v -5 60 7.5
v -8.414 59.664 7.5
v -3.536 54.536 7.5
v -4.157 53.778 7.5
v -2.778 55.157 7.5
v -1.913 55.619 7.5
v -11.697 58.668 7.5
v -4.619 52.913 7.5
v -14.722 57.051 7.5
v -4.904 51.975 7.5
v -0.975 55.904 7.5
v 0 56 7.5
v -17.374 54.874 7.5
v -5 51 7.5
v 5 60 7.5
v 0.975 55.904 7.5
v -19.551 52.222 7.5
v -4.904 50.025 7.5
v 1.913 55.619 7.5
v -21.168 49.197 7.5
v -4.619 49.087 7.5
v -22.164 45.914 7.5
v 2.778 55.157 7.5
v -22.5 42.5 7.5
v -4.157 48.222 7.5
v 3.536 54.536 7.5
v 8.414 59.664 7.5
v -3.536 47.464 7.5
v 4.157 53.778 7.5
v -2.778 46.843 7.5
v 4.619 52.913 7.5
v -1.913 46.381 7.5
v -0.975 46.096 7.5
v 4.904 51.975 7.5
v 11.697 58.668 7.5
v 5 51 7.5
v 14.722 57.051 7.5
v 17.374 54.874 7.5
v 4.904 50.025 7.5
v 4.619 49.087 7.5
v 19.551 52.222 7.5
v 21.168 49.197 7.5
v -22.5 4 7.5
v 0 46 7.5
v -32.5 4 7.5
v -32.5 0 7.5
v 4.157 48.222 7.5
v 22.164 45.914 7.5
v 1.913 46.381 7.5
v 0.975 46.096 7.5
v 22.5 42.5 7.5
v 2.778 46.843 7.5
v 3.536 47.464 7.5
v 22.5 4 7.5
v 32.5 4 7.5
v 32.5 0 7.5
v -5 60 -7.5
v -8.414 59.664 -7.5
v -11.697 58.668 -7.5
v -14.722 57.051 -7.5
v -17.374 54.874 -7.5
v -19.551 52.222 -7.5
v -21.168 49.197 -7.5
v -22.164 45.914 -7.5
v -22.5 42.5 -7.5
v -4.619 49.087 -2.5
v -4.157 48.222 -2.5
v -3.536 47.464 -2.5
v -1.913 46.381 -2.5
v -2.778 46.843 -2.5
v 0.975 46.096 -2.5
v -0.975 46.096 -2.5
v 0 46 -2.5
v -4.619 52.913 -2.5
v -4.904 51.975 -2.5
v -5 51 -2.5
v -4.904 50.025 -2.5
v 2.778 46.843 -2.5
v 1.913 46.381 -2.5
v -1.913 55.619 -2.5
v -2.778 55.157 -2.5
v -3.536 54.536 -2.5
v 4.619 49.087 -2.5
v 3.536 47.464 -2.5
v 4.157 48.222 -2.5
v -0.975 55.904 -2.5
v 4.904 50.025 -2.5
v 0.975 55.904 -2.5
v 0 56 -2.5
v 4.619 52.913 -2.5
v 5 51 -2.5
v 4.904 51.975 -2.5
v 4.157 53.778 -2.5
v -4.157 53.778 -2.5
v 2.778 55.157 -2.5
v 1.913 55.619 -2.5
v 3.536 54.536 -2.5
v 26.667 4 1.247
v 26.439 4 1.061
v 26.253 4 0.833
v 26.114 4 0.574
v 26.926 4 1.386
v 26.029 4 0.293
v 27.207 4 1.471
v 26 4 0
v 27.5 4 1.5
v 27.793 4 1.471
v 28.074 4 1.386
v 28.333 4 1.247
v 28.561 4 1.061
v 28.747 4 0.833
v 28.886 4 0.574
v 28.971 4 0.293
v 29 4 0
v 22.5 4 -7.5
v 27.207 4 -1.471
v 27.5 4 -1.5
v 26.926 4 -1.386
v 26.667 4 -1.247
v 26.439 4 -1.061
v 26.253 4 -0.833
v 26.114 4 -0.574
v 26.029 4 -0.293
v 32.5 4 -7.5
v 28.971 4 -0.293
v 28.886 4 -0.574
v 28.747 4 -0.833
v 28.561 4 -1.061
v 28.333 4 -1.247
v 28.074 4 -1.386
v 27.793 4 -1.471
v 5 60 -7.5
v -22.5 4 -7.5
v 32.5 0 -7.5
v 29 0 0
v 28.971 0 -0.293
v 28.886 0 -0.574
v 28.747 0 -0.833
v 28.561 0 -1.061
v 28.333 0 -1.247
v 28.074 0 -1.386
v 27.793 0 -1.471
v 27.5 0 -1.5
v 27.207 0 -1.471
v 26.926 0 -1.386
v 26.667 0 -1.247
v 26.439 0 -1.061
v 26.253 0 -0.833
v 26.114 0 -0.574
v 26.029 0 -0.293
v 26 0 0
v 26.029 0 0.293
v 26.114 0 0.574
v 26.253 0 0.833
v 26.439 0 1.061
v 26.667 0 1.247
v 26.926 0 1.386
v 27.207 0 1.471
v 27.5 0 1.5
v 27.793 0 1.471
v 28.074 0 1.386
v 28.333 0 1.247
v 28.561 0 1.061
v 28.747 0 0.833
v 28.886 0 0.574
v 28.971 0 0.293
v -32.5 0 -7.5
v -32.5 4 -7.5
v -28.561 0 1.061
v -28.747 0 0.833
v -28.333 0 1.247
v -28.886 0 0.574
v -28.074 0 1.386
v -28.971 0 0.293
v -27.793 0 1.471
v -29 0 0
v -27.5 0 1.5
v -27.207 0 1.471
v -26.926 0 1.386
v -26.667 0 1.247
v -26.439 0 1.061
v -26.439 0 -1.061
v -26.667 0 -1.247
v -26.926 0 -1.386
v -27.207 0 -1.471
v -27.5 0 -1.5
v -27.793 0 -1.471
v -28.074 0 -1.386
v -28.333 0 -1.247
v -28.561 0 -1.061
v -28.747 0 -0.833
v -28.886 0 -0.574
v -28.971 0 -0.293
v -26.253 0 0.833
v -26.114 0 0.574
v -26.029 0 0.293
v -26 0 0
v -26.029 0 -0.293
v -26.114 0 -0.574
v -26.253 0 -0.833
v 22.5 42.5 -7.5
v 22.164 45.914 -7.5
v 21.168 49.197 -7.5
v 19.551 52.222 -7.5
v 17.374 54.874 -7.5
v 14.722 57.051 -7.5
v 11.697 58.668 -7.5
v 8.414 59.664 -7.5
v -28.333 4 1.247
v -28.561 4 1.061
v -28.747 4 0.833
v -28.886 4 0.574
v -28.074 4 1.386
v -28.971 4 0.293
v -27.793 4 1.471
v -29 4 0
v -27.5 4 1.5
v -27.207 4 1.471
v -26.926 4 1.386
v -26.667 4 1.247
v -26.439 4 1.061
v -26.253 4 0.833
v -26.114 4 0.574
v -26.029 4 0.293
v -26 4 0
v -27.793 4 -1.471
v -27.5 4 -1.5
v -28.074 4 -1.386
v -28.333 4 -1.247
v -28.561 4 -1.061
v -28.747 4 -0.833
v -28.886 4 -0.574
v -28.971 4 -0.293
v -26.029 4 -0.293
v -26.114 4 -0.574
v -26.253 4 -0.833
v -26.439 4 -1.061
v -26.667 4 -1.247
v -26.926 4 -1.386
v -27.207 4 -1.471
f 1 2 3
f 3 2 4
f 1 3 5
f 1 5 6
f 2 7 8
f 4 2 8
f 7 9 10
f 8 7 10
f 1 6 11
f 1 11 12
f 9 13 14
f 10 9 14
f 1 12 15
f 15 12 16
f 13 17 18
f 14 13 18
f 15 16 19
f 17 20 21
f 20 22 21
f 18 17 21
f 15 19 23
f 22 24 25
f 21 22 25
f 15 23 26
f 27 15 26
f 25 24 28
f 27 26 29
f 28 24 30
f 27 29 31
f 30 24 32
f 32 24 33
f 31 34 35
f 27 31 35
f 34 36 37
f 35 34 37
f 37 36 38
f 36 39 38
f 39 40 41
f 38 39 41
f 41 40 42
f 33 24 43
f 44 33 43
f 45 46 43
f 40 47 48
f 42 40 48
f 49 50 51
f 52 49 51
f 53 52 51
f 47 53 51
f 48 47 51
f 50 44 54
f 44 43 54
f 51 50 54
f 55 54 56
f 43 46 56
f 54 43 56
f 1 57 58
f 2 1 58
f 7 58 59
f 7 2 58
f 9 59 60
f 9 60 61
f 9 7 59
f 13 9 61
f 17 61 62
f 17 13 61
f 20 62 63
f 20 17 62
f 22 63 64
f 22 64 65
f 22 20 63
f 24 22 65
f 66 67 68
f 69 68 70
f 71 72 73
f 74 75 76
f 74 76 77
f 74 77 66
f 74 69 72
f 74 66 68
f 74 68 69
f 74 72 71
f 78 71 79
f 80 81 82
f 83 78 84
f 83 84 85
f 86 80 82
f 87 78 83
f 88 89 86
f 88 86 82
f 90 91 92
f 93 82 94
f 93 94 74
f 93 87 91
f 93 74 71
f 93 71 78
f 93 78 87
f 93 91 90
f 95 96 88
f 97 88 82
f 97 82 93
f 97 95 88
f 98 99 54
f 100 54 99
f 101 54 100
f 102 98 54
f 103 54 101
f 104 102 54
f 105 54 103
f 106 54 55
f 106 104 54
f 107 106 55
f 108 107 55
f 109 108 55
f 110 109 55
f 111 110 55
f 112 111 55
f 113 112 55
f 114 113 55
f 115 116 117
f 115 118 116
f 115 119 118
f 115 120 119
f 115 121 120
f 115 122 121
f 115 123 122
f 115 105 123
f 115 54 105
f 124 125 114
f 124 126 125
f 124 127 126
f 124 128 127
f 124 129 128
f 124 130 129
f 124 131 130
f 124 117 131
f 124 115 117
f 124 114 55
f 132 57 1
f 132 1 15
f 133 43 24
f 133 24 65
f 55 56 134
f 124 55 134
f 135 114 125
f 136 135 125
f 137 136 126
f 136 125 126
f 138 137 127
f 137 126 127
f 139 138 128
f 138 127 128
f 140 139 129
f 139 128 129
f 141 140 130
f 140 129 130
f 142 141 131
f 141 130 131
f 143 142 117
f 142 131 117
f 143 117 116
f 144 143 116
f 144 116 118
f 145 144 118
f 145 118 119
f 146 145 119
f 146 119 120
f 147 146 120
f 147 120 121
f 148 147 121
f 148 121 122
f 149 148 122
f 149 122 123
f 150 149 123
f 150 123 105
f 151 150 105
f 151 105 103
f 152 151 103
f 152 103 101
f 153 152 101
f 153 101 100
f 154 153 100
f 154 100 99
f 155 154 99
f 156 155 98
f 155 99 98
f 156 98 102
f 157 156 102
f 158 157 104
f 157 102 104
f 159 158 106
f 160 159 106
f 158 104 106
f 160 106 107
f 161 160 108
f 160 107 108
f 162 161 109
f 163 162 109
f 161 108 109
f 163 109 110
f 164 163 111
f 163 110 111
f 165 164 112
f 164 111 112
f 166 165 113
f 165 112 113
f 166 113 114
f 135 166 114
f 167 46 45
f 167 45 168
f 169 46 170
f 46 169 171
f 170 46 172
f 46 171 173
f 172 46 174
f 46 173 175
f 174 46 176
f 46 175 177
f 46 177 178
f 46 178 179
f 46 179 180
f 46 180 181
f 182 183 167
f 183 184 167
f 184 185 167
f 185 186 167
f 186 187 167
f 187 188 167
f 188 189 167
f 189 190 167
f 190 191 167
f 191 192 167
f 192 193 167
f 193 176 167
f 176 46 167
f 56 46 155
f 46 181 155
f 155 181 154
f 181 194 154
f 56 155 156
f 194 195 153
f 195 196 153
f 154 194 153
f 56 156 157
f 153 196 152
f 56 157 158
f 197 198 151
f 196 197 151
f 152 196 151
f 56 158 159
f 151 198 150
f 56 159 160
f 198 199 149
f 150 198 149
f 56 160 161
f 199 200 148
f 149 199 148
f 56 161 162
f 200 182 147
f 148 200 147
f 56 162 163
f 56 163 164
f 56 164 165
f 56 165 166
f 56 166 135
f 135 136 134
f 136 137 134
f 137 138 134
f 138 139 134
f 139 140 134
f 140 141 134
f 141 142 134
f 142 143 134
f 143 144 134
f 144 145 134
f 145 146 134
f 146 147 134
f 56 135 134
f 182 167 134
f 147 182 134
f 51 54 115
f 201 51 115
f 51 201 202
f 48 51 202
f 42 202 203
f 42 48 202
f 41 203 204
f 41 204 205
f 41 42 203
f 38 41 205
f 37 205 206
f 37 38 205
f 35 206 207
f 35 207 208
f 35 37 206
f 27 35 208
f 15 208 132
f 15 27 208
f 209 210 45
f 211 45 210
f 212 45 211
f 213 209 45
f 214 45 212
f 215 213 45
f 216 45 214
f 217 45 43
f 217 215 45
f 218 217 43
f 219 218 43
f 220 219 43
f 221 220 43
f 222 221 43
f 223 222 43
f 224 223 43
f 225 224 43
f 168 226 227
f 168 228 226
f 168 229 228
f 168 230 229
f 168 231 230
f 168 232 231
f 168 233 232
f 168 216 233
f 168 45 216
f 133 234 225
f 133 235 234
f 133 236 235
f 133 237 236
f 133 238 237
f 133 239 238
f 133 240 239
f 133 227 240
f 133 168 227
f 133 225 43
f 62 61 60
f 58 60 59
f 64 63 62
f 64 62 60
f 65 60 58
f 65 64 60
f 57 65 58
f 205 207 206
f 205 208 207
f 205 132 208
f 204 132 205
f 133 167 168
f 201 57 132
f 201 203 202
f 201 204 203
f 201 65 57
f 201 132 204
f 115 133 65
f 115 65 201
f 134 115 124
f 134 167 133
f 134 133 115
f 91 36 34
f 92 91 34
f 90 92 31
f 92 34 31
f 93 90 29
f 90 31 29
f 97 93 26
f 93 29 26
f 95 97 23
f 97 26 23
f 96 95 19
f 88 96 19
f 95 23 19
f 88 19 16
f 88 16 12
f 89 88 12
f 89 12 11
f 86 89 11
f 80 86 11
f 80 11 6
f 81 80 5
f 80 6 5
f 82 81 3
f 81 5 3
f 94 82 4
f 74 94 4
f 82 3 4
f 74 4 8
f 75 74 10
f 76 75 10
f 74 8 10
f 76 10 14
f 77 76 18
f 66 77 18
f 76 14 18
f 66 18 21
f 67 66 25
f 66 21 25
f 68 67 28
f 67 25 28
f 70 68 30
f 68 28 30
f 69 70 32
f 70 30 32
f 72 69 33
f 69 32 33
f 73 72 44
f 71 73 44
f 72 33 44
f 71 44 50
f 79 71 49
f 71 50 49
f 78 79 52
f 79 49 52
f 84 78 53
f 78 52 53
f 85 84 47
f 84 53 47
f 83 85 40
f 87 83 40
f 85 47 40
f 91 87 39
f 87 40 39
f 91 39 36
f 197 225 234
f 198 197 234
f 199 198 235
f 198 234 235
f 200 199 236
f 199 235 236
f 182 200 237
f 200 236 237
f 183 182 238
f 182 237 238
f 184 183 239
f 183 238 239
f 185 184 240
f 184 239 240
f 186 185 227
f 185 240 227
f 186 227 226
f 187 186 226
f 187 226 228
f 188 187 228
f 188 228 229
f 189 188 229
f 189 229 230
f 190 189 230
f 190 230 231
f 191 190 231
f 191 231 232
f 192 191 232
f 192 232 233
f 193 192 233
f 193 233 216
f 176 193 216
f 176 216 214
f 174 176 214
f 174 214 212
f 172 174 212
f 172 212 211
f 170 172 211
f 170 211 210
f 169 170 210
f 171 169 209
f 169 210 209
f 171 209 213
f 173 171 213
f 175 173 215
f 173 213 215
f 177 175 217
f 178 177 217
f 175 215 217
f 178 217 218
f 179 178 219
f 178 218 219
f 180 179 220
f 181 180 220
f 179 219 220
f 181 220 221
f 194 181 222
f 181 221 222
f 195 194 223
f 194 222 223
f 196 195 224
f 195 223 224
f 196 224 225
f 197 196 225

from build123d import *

# Parameters (mm, degrees)
SKETCH1_W           = 65
SKETCH1_H           = 15
BOSS_EXTRUDE1_DEPTH = 4
SKETCH2_W           = 45
SKETCH2_H           = 15
BOSS_EXTRUDE2_DEPTH = 56
SKETCH3_R           = 5
CUT_EXTRUDE1_DEPTH  = 10
CUT_EXTRUDE4_REACH  = 6
SKETCH5_R           = 1.5
CUT_EXTRUDE5_REACH  = 17


with BuildPart() as part:
    # Sketch1 → Boss-Extrude1 (new body)
    with BuildSketch(Plane(origin=(0, 0, 0), x_dir=(1, 0, 0), z_dir=(0, 1, 0))):
        Rectangle(SKETCH1_W, SKETCH1_H)
    extrude(amount=BOSS_EXTRUDE1_DEPTH)

    # Sketch2 → Boss-Extrude2 (add)
    with BuildSketch(Plane(origin=(0, 4, 0), x_dir=(1, 0, 0), z_dir=(0, 1, 0))):
        Rectangle(SKETCH2_W, SKETCH2_H)
    extrude(amount=BOSS_EXTRUDE2_DEPTH)

    # Sketch3 → Cut-Extrude1 (cut)
    with BuildSketch(Plane.XY.offset(7.5)):
        with Locations((0, 51)):
            Circle(SKETCH3_R)
    extrude(amount=-CUT_EXTRUDE1_DEPTH, mode=Mode.SUBTRACT)

    # Sketch5 → Cut-Extrude4 (cut, up to next)
    with BuildSketch(Plane(origin=(0, 4, 0), x_dir=(1, 0, 0), z_dir=(0, 1, 0)), mode=Mode.PRIVATE) as cut_extrude4_sk1:
        with Locations((-27.5, 0)):
            Circle(SKETCH5_R)
    cut_extrude4_tool1 = extrude(cut_extrude4_sk1.sketch, amount=-CUT_EXTRUDE4_REACH, mode=Mode.PRIVATE) & part.part
    add(cut_extrude4_tool1.solids().sort_by_distance((-27.5, 4, 0))[0], mode=Mode.SUBTRACT)
    # Sketch5 → Cut-Extrude4 (cut, up to next)
    with BuildSketch(Plane(origin=(0, 4, 0), x_dir=(1, 0, 0), z_dir=(0, 1, 0)), mode=Mode.PRIVATE) as cut_extrude4_sk2:
        with Locations((27.5, 0)):
            Circle(SKETCH5_R)
    cut_extrude4_tool2 = extrude(cut_extrude4_sk2.sketch, amount=-CUT_EXTRUDE4_REACH, mode=Mode.PRIVATE) & part.part
    add(cut_extrude4_tool2.solids().sort_by_distance((27.5, 4, 0))[0], mode=Mode.SUBTRACT)

    # Sketch6 → Cut-Extrude5 (cut, up to next)
    with BuildSketch(Plane.XY.offset(7.5), mode=Mode.PRIVATE) as cut_extrude5_sk1:
        with BuildLine():
            Line((5, 60), (22.5, 60))
            Line((22.5, 60), (22.5, 42.5))
            ThreePointArc((22.5, 42.5), (17.374368671, 54.874368671), (5, 60))
        make_face()
    cut_extrude5_tool1 = extrude(cut_extrude5_sk1.sketch, amount=-CUT_EXTRUDE5_REACH, mode=Mode.PRIVATE) & part.part
    add(cut_extrude5_tool1.solids().sort_by_distance((18.591061, 56.091061, 7.5))[0], mode=Mode.SUBTRACT)
    # Sketch6 → Cut-Extrude5 (cut, up to next)
    with BuildSketch(Plane.XY.offset(7.5), mode=Mode.PRIVATE) as cut_extrude5_sk2:
        with BuildLine():
            Line((-22.5, 42.5), (-22.5, 60))
            Line((-22.5, 60), (-5, 60))
            ThreePointArc((-5, 60), (-17.374368671, 54.874368671), (-22.5, 42.5))
        make_face()
    cut_extrude5_tool2 = extrude(cut_extrude5_sk2.sketch, amount=-CUT_EXTRUDE5_REACH, mode=Mode.PRIVATE) & part.part
    add(cut_extrude5_tool2.solids().sort_by_distance((-18.591061, 56.091061, 7.5))[0], mode=Mode.SUBTRACT)


solid = part.part
